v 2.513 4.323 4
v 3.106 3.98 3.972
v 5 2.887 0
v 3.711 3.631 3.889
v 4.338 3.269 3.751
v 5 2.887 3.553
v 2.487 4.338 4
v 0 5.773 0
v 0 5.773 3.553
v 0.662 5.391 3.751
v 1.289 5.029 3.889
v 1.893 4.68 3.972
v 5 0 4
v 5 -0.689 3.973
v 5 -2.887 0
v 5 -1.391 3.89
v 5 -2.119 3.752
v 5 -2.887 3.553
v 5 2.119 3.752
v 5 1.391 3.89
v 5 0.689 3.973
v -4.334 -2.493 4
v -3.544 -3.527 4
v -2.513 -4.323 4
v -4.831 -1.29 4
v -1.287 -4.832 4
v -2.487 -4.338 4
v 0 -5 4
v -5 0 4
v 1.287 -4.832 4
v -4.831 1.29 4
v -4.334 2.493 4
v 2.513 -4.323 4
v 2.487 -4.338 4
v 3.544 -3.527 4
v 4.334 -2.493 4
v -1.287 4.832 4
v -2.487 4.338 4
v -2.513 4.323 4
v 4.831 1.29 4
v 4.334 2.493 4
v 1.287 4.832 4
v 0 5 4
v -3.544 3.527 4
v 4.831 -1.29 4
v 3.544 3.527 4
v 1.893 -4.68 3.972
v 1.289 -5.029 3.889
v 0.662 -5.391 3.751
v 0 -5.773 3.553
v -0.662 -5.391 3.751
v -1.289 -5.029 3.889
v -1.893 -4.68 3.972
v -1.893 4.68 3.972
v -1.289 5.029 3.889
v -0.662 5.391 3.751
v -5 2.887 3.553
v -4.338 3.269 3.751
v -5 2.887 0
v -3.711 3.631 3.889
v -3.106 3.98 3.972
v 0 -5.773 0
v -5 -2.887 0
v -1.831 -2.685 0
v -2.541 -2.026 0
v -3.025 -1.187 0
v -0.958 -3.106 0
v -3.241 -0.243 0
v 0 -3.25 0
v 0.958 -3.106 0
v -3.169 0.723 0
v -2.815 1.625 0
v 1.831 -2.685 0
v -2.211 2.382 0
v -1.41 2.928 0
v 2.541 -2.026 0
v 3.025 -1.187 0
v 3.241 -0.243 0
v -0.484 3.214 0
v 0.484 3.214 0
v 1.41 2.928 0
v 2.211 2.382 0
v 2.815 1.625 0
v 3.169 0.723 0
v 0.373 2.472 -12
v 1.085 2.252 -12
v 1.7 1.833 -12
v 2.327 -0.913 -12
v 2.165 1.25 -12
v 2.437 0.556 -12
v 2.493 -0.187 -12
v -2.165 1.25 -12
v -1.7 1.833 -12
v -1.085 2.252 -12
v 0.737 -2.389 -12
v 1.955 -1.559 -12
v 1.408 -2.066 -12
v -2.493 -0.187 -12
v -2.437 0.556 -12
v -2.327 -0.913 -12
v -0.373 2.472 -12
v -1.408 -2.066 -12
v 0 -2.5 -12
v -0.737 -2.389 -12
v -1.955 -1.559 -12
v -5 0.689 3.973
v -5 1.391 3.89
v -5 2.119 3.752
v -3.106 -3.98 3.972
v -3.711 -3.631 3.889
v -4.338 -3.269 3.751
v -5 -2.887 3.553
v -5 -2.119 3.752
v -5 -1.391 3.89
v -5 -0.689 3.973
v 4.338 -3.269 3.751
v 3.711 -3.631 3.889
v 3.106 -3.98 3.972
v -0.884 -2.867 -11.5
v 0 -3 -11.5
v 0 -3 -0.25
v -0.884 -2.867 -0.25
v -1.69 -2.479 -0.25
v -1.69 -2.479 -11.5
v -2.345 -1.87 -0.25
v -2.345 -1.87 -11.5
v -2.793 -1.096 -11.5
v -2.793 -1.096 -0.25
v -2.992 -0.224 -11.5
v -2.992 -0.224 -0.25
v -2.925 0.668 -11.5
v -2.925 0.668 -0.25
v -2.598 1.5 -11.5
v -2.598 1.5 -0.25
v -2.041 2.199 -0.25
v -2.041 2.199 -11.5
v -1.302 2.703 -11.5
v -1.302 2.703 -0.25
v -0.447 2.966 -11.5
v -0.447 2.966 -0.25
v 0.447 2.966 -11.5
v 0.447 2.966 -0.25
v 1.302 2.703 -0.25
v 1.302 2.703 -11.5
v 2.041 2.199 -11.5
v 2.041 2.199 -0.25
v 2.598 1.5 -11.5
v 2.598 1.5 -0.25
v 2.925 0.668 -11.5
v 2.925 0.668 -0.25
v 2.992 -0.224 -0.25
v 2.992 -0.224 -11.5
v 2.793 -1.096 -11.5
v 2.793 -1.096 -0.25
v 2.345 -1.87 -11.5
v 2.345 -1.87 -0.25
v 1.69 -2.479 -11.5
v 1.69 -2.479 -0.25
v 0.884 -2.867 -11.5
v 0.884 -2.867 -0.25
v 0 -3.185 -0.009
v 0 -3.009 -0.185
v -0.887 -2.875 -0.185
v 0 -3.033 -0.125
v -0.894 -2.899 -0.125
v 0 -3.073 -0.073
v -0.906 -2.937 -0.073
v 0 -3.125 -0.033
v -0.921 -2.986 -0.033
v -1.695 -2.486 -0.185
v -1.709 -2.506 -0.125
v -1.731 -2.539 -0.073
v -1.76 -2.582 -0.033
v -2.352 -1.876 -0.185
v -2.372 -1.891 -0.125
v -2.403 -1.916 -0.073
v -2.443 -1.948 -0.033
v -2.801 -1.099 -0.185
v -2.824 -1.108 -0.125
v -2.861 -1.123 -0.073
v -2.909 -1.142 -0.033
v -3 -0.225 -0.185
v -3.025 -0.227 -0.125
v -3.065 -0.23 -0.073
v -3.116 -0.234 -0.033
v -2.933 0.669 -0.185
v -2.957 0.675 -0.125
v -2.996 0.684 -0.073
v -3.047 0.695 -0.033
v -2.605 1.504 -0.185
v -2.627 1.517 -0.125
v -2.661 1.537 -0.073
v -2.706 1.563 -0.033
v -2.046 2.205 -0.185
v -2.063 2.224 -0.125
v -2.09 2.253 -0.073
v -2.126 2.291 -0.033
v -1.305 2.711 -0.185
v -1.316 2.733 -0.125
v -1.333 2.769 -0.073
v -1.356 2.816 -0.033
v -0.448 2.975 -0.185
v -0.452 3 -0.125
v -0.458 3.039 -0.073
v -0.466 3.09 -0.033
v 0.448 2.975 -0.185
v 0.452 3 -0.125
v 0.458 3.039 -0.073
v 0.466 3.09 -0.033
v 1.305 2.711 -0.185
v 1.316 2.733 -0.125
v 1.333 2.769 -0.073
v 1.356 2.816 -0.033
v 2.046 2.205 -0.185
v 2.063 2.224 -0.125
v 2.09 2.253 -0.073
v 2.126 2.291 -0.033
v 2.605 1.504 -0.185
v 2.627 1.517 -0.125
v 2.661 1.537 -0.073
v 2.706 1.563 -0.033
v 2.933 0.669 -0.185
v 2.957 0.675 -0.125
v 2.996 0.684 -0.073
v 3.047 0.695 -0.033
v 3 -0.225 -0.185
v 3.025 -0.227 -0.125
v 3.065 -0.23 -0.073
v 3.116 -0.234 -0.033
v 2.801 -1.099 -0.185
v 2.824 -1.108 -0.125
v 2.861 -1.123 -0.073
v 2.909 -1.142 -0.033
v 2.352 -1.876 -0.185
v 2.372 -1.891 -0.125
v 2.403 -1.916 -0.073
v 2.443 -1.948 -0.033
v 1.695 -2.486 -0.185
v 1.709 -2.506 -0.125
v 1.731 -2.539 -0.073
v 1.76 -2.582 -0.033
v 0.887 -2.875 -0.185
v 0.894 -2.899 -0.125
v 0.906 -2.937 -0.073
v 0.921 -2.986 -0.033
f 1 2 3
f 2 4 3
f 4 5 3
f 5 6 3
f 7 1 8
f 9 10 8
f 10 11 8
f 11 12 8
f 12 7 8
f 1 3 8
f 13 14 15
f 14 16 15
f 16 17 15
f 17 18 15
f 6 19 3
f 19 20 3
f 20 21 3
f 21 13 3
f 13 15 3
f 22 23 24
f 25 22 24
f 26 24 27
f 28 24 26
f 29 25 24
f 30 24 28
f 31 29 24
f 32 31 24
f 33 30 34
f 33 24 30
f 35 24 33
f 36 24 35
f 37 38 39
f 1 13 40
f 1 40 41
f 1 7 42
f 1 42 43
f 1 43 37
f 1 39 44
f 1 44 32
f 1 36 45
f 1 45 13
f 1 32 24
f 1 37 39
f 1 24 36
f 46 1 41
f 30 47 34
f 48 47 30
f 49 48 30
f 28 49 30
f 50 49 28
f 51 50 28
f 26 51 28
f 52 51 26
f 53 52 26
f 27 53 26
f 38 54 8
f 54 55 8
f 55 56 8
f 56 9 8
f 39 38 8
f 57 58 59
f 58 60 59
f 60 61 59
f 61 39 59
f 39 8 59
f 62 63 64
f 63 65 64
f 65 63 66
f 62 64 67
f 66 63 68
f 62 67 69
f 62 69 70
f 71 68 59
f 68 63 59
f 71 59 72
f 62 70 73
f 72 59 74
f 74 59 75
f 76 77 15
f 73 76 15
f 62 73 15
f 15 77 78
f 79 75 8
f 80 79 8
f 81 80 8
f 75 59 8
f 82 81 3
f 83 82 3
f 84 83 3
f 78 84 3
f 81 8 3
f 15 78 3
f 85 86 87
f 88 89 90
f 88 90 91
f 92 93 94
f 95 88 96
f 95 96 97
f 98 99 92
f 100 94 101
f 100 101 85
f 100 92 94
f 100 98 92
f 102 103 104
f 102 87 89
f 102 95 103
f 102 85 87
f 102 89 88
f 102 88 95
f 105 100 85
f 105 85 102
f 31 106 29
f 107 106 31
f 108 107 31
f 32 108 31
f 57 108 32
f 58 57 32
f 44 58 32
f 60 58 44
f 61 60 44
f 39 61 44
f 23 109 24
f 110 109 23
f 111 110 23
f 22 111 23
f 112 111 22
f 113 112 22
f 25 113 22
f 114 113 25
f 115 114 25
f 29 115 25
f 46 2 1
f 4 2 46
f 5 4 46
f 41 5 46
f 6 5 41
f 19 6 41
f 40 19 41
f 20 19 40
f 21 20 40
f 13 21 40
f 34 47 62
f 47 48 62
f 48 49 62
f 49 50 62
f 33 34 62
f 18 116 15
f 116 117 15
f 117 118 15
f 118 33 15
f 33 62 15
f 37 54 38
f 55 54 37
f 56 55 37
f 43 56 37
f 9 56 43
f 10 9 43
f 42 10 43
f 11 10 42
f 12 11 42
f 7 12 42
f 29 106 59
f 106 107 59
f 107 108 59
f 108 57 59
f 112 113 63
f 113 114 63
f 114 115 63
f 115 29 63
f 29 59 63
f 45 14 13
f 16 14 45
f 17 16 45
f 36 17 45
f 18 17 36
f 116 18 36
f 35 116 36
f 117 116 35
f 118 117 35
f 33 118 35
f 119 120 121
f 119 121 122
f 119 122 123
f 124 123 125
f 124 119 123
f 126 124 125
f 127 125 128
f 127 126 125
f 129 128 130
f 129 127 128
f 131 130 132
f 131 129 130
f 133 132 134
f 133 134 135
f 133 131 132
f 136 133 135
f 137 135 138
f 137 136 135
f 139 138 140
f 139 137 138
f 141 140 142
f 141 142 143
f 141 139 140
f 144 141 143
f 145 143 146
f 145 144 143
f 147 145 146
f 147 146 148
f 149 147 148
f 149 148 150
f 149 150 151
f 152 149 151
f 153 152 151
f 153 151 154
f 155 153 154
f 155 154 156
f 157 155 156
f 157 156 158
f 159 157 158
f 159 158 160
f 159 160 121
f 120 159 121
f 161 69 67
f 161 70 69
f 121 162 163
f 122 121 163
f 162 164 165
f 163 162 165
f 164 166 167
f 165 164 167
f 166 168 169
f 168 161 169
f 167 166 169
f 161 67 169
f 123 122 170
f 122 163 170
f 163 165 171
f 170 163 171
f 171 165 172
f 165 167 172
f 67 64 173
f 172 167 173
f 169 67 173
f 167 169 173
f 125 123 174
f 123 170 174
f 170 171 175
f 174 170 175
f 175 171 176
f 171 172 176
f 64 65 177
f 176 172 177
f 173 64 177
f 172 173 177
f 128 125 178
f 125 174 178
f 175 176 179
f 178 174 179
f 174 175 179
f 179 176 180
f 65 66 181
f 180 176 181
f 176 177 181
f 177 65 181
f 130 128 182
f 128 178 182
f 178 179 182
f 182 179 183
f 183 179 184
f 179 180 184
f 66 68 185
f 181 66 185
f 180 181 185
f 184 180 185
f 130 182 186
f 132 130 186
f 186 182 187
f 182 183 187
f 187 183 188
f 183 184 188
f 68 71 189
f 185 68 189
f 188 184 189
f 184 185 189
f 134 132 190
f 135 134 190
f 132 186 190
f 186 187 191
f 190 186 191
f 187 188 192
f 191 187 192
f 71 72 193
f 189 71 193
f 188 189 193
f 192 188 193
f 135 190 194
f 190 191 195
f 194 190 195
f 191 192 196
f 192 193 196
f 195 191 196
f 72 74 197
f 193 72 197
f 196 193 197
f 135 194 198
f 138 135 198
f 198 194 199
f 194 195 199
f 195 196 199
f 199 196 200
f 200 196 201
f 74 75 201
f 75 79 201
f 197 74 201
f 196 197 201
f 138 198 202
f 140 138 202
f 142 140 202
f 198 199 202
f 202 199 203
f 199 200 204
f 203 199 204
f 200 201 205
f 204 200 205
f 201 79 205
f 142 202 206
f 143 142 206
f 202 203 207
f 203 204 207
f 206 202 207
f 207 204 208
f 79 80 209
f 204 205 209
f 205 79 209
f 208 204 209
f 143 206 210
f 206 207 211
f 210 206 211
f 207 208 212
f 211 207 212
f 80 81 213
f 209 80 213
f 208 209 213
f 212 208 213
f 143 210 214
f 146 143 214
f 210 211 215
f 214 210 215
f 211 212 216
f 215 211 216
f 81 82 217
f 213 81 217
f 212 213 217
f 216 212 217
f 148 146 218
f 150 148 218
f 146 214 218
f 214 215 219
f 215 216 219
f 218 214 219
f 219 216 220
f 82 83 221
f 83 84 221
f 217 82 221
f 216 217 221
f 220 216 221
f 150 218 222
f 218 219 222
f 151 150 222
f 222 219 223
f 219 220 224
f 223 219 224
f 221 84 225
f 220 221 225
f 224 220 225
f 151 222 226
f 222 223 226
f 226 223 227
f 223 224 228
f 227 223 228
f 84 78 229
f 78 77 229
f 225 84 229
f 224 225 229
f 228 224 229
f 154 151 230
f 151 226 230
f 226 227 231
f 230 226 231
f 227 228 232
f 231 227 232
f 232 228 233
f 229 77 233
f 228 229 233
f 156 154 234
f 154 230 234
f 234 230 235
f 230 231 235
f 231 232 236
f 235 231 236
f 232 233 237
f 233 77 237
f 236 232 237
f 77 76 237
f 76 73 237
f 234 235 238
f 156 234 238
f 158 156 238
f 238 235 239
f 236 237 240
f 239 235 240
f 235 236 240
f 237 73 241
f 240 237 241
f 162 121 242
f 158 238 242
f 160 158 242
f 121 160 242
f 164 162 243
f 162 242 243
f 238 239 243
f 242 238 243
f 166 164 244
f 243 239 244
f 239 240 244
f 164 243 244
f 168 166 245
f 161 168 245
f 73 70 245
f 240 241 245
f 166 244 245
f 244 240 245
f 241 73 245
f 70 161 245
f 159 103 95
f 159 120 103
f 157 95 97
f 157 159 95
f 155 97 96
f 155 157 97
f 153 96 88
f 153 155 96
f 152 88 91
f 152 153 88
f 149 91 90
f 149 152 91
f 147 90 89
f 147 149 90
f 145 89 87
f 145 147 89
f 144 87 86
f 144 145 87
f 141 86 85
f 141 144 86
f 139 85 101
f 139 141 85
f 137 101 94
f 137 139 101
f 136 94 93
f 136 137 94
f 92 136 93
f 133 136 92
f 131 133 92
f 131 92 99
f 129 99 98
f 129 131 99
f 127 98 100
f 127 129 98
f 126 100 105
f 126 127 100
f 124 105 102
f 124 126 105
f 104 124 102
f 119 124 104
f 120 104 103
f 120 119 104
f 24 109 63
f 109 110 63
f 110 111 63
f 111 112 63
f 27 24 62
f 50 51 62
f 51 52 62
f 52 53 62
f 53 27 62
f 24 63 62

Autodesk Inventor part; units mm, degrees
ref_plane "WorkPlane1" through (0, 0, 0) normal (0, 0, 1) x (1, 0, 0)
sketch "Sketch1" plane through (0, 0, 0) normal (0, 0, 1) x (1, 0, 0)
  point P0 (0, 0)
sketch "Sketch2" plane through (0, 0, 0) normal (0, 0, 1) x (1, 0, 0)
  line L0 (-5, 2.8868) -> (-5, -2.8868)
  line L1 (0, 5.7734) -> (-5, 2.8868)
  line L2 (5, 2.8868) -> (0, 5.7734)
  line L3 (5, -2.8868) -> (5, 2.8868)
  line L4 (0, -5.7734) -> (5, -2.8868)
  line L5 (-5, -2.8868) -> (0, -5.7734)
  circle A0 centre (0, 0) radius 5 construction
  dimension "d1" = 10
  dimension "d29" = 0
  dimension "d30" = 0
extrude "Extrusion1" add sketch "Sketch2" along normal blind 4
sketch "Sketch3" plane through (0, 0, 0) normal (1, 0, 0) x (0, 1, 0)
  line L0 (5, 4) -> (5.8734, 4)
  line L1 (5.8734, 3.4957) -> (5, 4)
  line L2 (5.8734, 4) -> (5.8734, 3.4957)
  line L3 (0, -0.8) -> (0, 4.8) projected
  line L4 (5.7734, 0) -> (5.7734, 4) projected
  dimension "d25" = 0.1
  dimension "d26" = 0
  dimension "d27" = 60
  dimension "d28" = 5
revolve "Revolution1" cut sketch "Sketch3" angle 360 about axis through (0, 0, -10) along (0, 0, 1)
sketch "Sketch4" plane through (0, 0, 0) normal (1, 0, 0) x (0, 1, 0)
  line L0 (0, -12) -> (0, 0)
  line L1 (-3, -12) -> (0, -12)
  line L2 (-3, 0) -> (-3, -12)
  line L3 (0, 0) -> (-3, 0)
  line L4 (0, -12) -> (0, 0)
  line L5 (-3.6, 0) -> (0.6, 0) projected
  line L6 (0, -14.4) -> (0, 2.4) projected
  dimension "d18" = 3
  dimension "d20" = 12
  dimension "d33" = 0
  dimension "d34" = 0
revolve "Revolution2" add sketch "Sketch4" angle 360 about axis through (0, 0, -12) along (0, 0, -1)
chamfer "Chamfer1" distance 0.5 angle 45 1 edges at (0, 3, -12)
fillet "Fillet1" radius 0.25 1 edges at (0, 3, 0)
thread "Thread1" size "M6x1" class "6g" standard "ISO Metric profile" length 10
ref_plane "MSC_PF1" through (0, 0, 0) normal (1, 0, 0) x (0, 1, 0)
ref_plane "MSC_PT1" through (0, 0, 0) normal (0, 0, -1) x (-1, 0, 0)
equation "\"d22\" = 0.5 * PTC"
equation "\"d23\" = 0.5 * PTC"
equation "\"d24\" = r"
equation "\"d1\" = ParS"
equation "\"d6\" = ParK"
equation "\"b\" = NLG - 2 * PTC"
equation "\"d28\" = 0.5 * ParS"
equation "\"d18\" = 0.5 * NND"
equation "\"d20\" = NLG"
equation "\"NND\" = 6"
equation "\"NLG\" = 12"
equation "\"PTC\" = 1"
equation "\"ParK\" = 4"
equation "\"ParS\" = 10"
equation "\"msp_es\" = 0.577367 * ParS"
equation "\"r\" = 0.25"
equation "\"THREADDIA\" = NND"
properties part number "ISO 4018 - M6 x 12" material "Steel"
